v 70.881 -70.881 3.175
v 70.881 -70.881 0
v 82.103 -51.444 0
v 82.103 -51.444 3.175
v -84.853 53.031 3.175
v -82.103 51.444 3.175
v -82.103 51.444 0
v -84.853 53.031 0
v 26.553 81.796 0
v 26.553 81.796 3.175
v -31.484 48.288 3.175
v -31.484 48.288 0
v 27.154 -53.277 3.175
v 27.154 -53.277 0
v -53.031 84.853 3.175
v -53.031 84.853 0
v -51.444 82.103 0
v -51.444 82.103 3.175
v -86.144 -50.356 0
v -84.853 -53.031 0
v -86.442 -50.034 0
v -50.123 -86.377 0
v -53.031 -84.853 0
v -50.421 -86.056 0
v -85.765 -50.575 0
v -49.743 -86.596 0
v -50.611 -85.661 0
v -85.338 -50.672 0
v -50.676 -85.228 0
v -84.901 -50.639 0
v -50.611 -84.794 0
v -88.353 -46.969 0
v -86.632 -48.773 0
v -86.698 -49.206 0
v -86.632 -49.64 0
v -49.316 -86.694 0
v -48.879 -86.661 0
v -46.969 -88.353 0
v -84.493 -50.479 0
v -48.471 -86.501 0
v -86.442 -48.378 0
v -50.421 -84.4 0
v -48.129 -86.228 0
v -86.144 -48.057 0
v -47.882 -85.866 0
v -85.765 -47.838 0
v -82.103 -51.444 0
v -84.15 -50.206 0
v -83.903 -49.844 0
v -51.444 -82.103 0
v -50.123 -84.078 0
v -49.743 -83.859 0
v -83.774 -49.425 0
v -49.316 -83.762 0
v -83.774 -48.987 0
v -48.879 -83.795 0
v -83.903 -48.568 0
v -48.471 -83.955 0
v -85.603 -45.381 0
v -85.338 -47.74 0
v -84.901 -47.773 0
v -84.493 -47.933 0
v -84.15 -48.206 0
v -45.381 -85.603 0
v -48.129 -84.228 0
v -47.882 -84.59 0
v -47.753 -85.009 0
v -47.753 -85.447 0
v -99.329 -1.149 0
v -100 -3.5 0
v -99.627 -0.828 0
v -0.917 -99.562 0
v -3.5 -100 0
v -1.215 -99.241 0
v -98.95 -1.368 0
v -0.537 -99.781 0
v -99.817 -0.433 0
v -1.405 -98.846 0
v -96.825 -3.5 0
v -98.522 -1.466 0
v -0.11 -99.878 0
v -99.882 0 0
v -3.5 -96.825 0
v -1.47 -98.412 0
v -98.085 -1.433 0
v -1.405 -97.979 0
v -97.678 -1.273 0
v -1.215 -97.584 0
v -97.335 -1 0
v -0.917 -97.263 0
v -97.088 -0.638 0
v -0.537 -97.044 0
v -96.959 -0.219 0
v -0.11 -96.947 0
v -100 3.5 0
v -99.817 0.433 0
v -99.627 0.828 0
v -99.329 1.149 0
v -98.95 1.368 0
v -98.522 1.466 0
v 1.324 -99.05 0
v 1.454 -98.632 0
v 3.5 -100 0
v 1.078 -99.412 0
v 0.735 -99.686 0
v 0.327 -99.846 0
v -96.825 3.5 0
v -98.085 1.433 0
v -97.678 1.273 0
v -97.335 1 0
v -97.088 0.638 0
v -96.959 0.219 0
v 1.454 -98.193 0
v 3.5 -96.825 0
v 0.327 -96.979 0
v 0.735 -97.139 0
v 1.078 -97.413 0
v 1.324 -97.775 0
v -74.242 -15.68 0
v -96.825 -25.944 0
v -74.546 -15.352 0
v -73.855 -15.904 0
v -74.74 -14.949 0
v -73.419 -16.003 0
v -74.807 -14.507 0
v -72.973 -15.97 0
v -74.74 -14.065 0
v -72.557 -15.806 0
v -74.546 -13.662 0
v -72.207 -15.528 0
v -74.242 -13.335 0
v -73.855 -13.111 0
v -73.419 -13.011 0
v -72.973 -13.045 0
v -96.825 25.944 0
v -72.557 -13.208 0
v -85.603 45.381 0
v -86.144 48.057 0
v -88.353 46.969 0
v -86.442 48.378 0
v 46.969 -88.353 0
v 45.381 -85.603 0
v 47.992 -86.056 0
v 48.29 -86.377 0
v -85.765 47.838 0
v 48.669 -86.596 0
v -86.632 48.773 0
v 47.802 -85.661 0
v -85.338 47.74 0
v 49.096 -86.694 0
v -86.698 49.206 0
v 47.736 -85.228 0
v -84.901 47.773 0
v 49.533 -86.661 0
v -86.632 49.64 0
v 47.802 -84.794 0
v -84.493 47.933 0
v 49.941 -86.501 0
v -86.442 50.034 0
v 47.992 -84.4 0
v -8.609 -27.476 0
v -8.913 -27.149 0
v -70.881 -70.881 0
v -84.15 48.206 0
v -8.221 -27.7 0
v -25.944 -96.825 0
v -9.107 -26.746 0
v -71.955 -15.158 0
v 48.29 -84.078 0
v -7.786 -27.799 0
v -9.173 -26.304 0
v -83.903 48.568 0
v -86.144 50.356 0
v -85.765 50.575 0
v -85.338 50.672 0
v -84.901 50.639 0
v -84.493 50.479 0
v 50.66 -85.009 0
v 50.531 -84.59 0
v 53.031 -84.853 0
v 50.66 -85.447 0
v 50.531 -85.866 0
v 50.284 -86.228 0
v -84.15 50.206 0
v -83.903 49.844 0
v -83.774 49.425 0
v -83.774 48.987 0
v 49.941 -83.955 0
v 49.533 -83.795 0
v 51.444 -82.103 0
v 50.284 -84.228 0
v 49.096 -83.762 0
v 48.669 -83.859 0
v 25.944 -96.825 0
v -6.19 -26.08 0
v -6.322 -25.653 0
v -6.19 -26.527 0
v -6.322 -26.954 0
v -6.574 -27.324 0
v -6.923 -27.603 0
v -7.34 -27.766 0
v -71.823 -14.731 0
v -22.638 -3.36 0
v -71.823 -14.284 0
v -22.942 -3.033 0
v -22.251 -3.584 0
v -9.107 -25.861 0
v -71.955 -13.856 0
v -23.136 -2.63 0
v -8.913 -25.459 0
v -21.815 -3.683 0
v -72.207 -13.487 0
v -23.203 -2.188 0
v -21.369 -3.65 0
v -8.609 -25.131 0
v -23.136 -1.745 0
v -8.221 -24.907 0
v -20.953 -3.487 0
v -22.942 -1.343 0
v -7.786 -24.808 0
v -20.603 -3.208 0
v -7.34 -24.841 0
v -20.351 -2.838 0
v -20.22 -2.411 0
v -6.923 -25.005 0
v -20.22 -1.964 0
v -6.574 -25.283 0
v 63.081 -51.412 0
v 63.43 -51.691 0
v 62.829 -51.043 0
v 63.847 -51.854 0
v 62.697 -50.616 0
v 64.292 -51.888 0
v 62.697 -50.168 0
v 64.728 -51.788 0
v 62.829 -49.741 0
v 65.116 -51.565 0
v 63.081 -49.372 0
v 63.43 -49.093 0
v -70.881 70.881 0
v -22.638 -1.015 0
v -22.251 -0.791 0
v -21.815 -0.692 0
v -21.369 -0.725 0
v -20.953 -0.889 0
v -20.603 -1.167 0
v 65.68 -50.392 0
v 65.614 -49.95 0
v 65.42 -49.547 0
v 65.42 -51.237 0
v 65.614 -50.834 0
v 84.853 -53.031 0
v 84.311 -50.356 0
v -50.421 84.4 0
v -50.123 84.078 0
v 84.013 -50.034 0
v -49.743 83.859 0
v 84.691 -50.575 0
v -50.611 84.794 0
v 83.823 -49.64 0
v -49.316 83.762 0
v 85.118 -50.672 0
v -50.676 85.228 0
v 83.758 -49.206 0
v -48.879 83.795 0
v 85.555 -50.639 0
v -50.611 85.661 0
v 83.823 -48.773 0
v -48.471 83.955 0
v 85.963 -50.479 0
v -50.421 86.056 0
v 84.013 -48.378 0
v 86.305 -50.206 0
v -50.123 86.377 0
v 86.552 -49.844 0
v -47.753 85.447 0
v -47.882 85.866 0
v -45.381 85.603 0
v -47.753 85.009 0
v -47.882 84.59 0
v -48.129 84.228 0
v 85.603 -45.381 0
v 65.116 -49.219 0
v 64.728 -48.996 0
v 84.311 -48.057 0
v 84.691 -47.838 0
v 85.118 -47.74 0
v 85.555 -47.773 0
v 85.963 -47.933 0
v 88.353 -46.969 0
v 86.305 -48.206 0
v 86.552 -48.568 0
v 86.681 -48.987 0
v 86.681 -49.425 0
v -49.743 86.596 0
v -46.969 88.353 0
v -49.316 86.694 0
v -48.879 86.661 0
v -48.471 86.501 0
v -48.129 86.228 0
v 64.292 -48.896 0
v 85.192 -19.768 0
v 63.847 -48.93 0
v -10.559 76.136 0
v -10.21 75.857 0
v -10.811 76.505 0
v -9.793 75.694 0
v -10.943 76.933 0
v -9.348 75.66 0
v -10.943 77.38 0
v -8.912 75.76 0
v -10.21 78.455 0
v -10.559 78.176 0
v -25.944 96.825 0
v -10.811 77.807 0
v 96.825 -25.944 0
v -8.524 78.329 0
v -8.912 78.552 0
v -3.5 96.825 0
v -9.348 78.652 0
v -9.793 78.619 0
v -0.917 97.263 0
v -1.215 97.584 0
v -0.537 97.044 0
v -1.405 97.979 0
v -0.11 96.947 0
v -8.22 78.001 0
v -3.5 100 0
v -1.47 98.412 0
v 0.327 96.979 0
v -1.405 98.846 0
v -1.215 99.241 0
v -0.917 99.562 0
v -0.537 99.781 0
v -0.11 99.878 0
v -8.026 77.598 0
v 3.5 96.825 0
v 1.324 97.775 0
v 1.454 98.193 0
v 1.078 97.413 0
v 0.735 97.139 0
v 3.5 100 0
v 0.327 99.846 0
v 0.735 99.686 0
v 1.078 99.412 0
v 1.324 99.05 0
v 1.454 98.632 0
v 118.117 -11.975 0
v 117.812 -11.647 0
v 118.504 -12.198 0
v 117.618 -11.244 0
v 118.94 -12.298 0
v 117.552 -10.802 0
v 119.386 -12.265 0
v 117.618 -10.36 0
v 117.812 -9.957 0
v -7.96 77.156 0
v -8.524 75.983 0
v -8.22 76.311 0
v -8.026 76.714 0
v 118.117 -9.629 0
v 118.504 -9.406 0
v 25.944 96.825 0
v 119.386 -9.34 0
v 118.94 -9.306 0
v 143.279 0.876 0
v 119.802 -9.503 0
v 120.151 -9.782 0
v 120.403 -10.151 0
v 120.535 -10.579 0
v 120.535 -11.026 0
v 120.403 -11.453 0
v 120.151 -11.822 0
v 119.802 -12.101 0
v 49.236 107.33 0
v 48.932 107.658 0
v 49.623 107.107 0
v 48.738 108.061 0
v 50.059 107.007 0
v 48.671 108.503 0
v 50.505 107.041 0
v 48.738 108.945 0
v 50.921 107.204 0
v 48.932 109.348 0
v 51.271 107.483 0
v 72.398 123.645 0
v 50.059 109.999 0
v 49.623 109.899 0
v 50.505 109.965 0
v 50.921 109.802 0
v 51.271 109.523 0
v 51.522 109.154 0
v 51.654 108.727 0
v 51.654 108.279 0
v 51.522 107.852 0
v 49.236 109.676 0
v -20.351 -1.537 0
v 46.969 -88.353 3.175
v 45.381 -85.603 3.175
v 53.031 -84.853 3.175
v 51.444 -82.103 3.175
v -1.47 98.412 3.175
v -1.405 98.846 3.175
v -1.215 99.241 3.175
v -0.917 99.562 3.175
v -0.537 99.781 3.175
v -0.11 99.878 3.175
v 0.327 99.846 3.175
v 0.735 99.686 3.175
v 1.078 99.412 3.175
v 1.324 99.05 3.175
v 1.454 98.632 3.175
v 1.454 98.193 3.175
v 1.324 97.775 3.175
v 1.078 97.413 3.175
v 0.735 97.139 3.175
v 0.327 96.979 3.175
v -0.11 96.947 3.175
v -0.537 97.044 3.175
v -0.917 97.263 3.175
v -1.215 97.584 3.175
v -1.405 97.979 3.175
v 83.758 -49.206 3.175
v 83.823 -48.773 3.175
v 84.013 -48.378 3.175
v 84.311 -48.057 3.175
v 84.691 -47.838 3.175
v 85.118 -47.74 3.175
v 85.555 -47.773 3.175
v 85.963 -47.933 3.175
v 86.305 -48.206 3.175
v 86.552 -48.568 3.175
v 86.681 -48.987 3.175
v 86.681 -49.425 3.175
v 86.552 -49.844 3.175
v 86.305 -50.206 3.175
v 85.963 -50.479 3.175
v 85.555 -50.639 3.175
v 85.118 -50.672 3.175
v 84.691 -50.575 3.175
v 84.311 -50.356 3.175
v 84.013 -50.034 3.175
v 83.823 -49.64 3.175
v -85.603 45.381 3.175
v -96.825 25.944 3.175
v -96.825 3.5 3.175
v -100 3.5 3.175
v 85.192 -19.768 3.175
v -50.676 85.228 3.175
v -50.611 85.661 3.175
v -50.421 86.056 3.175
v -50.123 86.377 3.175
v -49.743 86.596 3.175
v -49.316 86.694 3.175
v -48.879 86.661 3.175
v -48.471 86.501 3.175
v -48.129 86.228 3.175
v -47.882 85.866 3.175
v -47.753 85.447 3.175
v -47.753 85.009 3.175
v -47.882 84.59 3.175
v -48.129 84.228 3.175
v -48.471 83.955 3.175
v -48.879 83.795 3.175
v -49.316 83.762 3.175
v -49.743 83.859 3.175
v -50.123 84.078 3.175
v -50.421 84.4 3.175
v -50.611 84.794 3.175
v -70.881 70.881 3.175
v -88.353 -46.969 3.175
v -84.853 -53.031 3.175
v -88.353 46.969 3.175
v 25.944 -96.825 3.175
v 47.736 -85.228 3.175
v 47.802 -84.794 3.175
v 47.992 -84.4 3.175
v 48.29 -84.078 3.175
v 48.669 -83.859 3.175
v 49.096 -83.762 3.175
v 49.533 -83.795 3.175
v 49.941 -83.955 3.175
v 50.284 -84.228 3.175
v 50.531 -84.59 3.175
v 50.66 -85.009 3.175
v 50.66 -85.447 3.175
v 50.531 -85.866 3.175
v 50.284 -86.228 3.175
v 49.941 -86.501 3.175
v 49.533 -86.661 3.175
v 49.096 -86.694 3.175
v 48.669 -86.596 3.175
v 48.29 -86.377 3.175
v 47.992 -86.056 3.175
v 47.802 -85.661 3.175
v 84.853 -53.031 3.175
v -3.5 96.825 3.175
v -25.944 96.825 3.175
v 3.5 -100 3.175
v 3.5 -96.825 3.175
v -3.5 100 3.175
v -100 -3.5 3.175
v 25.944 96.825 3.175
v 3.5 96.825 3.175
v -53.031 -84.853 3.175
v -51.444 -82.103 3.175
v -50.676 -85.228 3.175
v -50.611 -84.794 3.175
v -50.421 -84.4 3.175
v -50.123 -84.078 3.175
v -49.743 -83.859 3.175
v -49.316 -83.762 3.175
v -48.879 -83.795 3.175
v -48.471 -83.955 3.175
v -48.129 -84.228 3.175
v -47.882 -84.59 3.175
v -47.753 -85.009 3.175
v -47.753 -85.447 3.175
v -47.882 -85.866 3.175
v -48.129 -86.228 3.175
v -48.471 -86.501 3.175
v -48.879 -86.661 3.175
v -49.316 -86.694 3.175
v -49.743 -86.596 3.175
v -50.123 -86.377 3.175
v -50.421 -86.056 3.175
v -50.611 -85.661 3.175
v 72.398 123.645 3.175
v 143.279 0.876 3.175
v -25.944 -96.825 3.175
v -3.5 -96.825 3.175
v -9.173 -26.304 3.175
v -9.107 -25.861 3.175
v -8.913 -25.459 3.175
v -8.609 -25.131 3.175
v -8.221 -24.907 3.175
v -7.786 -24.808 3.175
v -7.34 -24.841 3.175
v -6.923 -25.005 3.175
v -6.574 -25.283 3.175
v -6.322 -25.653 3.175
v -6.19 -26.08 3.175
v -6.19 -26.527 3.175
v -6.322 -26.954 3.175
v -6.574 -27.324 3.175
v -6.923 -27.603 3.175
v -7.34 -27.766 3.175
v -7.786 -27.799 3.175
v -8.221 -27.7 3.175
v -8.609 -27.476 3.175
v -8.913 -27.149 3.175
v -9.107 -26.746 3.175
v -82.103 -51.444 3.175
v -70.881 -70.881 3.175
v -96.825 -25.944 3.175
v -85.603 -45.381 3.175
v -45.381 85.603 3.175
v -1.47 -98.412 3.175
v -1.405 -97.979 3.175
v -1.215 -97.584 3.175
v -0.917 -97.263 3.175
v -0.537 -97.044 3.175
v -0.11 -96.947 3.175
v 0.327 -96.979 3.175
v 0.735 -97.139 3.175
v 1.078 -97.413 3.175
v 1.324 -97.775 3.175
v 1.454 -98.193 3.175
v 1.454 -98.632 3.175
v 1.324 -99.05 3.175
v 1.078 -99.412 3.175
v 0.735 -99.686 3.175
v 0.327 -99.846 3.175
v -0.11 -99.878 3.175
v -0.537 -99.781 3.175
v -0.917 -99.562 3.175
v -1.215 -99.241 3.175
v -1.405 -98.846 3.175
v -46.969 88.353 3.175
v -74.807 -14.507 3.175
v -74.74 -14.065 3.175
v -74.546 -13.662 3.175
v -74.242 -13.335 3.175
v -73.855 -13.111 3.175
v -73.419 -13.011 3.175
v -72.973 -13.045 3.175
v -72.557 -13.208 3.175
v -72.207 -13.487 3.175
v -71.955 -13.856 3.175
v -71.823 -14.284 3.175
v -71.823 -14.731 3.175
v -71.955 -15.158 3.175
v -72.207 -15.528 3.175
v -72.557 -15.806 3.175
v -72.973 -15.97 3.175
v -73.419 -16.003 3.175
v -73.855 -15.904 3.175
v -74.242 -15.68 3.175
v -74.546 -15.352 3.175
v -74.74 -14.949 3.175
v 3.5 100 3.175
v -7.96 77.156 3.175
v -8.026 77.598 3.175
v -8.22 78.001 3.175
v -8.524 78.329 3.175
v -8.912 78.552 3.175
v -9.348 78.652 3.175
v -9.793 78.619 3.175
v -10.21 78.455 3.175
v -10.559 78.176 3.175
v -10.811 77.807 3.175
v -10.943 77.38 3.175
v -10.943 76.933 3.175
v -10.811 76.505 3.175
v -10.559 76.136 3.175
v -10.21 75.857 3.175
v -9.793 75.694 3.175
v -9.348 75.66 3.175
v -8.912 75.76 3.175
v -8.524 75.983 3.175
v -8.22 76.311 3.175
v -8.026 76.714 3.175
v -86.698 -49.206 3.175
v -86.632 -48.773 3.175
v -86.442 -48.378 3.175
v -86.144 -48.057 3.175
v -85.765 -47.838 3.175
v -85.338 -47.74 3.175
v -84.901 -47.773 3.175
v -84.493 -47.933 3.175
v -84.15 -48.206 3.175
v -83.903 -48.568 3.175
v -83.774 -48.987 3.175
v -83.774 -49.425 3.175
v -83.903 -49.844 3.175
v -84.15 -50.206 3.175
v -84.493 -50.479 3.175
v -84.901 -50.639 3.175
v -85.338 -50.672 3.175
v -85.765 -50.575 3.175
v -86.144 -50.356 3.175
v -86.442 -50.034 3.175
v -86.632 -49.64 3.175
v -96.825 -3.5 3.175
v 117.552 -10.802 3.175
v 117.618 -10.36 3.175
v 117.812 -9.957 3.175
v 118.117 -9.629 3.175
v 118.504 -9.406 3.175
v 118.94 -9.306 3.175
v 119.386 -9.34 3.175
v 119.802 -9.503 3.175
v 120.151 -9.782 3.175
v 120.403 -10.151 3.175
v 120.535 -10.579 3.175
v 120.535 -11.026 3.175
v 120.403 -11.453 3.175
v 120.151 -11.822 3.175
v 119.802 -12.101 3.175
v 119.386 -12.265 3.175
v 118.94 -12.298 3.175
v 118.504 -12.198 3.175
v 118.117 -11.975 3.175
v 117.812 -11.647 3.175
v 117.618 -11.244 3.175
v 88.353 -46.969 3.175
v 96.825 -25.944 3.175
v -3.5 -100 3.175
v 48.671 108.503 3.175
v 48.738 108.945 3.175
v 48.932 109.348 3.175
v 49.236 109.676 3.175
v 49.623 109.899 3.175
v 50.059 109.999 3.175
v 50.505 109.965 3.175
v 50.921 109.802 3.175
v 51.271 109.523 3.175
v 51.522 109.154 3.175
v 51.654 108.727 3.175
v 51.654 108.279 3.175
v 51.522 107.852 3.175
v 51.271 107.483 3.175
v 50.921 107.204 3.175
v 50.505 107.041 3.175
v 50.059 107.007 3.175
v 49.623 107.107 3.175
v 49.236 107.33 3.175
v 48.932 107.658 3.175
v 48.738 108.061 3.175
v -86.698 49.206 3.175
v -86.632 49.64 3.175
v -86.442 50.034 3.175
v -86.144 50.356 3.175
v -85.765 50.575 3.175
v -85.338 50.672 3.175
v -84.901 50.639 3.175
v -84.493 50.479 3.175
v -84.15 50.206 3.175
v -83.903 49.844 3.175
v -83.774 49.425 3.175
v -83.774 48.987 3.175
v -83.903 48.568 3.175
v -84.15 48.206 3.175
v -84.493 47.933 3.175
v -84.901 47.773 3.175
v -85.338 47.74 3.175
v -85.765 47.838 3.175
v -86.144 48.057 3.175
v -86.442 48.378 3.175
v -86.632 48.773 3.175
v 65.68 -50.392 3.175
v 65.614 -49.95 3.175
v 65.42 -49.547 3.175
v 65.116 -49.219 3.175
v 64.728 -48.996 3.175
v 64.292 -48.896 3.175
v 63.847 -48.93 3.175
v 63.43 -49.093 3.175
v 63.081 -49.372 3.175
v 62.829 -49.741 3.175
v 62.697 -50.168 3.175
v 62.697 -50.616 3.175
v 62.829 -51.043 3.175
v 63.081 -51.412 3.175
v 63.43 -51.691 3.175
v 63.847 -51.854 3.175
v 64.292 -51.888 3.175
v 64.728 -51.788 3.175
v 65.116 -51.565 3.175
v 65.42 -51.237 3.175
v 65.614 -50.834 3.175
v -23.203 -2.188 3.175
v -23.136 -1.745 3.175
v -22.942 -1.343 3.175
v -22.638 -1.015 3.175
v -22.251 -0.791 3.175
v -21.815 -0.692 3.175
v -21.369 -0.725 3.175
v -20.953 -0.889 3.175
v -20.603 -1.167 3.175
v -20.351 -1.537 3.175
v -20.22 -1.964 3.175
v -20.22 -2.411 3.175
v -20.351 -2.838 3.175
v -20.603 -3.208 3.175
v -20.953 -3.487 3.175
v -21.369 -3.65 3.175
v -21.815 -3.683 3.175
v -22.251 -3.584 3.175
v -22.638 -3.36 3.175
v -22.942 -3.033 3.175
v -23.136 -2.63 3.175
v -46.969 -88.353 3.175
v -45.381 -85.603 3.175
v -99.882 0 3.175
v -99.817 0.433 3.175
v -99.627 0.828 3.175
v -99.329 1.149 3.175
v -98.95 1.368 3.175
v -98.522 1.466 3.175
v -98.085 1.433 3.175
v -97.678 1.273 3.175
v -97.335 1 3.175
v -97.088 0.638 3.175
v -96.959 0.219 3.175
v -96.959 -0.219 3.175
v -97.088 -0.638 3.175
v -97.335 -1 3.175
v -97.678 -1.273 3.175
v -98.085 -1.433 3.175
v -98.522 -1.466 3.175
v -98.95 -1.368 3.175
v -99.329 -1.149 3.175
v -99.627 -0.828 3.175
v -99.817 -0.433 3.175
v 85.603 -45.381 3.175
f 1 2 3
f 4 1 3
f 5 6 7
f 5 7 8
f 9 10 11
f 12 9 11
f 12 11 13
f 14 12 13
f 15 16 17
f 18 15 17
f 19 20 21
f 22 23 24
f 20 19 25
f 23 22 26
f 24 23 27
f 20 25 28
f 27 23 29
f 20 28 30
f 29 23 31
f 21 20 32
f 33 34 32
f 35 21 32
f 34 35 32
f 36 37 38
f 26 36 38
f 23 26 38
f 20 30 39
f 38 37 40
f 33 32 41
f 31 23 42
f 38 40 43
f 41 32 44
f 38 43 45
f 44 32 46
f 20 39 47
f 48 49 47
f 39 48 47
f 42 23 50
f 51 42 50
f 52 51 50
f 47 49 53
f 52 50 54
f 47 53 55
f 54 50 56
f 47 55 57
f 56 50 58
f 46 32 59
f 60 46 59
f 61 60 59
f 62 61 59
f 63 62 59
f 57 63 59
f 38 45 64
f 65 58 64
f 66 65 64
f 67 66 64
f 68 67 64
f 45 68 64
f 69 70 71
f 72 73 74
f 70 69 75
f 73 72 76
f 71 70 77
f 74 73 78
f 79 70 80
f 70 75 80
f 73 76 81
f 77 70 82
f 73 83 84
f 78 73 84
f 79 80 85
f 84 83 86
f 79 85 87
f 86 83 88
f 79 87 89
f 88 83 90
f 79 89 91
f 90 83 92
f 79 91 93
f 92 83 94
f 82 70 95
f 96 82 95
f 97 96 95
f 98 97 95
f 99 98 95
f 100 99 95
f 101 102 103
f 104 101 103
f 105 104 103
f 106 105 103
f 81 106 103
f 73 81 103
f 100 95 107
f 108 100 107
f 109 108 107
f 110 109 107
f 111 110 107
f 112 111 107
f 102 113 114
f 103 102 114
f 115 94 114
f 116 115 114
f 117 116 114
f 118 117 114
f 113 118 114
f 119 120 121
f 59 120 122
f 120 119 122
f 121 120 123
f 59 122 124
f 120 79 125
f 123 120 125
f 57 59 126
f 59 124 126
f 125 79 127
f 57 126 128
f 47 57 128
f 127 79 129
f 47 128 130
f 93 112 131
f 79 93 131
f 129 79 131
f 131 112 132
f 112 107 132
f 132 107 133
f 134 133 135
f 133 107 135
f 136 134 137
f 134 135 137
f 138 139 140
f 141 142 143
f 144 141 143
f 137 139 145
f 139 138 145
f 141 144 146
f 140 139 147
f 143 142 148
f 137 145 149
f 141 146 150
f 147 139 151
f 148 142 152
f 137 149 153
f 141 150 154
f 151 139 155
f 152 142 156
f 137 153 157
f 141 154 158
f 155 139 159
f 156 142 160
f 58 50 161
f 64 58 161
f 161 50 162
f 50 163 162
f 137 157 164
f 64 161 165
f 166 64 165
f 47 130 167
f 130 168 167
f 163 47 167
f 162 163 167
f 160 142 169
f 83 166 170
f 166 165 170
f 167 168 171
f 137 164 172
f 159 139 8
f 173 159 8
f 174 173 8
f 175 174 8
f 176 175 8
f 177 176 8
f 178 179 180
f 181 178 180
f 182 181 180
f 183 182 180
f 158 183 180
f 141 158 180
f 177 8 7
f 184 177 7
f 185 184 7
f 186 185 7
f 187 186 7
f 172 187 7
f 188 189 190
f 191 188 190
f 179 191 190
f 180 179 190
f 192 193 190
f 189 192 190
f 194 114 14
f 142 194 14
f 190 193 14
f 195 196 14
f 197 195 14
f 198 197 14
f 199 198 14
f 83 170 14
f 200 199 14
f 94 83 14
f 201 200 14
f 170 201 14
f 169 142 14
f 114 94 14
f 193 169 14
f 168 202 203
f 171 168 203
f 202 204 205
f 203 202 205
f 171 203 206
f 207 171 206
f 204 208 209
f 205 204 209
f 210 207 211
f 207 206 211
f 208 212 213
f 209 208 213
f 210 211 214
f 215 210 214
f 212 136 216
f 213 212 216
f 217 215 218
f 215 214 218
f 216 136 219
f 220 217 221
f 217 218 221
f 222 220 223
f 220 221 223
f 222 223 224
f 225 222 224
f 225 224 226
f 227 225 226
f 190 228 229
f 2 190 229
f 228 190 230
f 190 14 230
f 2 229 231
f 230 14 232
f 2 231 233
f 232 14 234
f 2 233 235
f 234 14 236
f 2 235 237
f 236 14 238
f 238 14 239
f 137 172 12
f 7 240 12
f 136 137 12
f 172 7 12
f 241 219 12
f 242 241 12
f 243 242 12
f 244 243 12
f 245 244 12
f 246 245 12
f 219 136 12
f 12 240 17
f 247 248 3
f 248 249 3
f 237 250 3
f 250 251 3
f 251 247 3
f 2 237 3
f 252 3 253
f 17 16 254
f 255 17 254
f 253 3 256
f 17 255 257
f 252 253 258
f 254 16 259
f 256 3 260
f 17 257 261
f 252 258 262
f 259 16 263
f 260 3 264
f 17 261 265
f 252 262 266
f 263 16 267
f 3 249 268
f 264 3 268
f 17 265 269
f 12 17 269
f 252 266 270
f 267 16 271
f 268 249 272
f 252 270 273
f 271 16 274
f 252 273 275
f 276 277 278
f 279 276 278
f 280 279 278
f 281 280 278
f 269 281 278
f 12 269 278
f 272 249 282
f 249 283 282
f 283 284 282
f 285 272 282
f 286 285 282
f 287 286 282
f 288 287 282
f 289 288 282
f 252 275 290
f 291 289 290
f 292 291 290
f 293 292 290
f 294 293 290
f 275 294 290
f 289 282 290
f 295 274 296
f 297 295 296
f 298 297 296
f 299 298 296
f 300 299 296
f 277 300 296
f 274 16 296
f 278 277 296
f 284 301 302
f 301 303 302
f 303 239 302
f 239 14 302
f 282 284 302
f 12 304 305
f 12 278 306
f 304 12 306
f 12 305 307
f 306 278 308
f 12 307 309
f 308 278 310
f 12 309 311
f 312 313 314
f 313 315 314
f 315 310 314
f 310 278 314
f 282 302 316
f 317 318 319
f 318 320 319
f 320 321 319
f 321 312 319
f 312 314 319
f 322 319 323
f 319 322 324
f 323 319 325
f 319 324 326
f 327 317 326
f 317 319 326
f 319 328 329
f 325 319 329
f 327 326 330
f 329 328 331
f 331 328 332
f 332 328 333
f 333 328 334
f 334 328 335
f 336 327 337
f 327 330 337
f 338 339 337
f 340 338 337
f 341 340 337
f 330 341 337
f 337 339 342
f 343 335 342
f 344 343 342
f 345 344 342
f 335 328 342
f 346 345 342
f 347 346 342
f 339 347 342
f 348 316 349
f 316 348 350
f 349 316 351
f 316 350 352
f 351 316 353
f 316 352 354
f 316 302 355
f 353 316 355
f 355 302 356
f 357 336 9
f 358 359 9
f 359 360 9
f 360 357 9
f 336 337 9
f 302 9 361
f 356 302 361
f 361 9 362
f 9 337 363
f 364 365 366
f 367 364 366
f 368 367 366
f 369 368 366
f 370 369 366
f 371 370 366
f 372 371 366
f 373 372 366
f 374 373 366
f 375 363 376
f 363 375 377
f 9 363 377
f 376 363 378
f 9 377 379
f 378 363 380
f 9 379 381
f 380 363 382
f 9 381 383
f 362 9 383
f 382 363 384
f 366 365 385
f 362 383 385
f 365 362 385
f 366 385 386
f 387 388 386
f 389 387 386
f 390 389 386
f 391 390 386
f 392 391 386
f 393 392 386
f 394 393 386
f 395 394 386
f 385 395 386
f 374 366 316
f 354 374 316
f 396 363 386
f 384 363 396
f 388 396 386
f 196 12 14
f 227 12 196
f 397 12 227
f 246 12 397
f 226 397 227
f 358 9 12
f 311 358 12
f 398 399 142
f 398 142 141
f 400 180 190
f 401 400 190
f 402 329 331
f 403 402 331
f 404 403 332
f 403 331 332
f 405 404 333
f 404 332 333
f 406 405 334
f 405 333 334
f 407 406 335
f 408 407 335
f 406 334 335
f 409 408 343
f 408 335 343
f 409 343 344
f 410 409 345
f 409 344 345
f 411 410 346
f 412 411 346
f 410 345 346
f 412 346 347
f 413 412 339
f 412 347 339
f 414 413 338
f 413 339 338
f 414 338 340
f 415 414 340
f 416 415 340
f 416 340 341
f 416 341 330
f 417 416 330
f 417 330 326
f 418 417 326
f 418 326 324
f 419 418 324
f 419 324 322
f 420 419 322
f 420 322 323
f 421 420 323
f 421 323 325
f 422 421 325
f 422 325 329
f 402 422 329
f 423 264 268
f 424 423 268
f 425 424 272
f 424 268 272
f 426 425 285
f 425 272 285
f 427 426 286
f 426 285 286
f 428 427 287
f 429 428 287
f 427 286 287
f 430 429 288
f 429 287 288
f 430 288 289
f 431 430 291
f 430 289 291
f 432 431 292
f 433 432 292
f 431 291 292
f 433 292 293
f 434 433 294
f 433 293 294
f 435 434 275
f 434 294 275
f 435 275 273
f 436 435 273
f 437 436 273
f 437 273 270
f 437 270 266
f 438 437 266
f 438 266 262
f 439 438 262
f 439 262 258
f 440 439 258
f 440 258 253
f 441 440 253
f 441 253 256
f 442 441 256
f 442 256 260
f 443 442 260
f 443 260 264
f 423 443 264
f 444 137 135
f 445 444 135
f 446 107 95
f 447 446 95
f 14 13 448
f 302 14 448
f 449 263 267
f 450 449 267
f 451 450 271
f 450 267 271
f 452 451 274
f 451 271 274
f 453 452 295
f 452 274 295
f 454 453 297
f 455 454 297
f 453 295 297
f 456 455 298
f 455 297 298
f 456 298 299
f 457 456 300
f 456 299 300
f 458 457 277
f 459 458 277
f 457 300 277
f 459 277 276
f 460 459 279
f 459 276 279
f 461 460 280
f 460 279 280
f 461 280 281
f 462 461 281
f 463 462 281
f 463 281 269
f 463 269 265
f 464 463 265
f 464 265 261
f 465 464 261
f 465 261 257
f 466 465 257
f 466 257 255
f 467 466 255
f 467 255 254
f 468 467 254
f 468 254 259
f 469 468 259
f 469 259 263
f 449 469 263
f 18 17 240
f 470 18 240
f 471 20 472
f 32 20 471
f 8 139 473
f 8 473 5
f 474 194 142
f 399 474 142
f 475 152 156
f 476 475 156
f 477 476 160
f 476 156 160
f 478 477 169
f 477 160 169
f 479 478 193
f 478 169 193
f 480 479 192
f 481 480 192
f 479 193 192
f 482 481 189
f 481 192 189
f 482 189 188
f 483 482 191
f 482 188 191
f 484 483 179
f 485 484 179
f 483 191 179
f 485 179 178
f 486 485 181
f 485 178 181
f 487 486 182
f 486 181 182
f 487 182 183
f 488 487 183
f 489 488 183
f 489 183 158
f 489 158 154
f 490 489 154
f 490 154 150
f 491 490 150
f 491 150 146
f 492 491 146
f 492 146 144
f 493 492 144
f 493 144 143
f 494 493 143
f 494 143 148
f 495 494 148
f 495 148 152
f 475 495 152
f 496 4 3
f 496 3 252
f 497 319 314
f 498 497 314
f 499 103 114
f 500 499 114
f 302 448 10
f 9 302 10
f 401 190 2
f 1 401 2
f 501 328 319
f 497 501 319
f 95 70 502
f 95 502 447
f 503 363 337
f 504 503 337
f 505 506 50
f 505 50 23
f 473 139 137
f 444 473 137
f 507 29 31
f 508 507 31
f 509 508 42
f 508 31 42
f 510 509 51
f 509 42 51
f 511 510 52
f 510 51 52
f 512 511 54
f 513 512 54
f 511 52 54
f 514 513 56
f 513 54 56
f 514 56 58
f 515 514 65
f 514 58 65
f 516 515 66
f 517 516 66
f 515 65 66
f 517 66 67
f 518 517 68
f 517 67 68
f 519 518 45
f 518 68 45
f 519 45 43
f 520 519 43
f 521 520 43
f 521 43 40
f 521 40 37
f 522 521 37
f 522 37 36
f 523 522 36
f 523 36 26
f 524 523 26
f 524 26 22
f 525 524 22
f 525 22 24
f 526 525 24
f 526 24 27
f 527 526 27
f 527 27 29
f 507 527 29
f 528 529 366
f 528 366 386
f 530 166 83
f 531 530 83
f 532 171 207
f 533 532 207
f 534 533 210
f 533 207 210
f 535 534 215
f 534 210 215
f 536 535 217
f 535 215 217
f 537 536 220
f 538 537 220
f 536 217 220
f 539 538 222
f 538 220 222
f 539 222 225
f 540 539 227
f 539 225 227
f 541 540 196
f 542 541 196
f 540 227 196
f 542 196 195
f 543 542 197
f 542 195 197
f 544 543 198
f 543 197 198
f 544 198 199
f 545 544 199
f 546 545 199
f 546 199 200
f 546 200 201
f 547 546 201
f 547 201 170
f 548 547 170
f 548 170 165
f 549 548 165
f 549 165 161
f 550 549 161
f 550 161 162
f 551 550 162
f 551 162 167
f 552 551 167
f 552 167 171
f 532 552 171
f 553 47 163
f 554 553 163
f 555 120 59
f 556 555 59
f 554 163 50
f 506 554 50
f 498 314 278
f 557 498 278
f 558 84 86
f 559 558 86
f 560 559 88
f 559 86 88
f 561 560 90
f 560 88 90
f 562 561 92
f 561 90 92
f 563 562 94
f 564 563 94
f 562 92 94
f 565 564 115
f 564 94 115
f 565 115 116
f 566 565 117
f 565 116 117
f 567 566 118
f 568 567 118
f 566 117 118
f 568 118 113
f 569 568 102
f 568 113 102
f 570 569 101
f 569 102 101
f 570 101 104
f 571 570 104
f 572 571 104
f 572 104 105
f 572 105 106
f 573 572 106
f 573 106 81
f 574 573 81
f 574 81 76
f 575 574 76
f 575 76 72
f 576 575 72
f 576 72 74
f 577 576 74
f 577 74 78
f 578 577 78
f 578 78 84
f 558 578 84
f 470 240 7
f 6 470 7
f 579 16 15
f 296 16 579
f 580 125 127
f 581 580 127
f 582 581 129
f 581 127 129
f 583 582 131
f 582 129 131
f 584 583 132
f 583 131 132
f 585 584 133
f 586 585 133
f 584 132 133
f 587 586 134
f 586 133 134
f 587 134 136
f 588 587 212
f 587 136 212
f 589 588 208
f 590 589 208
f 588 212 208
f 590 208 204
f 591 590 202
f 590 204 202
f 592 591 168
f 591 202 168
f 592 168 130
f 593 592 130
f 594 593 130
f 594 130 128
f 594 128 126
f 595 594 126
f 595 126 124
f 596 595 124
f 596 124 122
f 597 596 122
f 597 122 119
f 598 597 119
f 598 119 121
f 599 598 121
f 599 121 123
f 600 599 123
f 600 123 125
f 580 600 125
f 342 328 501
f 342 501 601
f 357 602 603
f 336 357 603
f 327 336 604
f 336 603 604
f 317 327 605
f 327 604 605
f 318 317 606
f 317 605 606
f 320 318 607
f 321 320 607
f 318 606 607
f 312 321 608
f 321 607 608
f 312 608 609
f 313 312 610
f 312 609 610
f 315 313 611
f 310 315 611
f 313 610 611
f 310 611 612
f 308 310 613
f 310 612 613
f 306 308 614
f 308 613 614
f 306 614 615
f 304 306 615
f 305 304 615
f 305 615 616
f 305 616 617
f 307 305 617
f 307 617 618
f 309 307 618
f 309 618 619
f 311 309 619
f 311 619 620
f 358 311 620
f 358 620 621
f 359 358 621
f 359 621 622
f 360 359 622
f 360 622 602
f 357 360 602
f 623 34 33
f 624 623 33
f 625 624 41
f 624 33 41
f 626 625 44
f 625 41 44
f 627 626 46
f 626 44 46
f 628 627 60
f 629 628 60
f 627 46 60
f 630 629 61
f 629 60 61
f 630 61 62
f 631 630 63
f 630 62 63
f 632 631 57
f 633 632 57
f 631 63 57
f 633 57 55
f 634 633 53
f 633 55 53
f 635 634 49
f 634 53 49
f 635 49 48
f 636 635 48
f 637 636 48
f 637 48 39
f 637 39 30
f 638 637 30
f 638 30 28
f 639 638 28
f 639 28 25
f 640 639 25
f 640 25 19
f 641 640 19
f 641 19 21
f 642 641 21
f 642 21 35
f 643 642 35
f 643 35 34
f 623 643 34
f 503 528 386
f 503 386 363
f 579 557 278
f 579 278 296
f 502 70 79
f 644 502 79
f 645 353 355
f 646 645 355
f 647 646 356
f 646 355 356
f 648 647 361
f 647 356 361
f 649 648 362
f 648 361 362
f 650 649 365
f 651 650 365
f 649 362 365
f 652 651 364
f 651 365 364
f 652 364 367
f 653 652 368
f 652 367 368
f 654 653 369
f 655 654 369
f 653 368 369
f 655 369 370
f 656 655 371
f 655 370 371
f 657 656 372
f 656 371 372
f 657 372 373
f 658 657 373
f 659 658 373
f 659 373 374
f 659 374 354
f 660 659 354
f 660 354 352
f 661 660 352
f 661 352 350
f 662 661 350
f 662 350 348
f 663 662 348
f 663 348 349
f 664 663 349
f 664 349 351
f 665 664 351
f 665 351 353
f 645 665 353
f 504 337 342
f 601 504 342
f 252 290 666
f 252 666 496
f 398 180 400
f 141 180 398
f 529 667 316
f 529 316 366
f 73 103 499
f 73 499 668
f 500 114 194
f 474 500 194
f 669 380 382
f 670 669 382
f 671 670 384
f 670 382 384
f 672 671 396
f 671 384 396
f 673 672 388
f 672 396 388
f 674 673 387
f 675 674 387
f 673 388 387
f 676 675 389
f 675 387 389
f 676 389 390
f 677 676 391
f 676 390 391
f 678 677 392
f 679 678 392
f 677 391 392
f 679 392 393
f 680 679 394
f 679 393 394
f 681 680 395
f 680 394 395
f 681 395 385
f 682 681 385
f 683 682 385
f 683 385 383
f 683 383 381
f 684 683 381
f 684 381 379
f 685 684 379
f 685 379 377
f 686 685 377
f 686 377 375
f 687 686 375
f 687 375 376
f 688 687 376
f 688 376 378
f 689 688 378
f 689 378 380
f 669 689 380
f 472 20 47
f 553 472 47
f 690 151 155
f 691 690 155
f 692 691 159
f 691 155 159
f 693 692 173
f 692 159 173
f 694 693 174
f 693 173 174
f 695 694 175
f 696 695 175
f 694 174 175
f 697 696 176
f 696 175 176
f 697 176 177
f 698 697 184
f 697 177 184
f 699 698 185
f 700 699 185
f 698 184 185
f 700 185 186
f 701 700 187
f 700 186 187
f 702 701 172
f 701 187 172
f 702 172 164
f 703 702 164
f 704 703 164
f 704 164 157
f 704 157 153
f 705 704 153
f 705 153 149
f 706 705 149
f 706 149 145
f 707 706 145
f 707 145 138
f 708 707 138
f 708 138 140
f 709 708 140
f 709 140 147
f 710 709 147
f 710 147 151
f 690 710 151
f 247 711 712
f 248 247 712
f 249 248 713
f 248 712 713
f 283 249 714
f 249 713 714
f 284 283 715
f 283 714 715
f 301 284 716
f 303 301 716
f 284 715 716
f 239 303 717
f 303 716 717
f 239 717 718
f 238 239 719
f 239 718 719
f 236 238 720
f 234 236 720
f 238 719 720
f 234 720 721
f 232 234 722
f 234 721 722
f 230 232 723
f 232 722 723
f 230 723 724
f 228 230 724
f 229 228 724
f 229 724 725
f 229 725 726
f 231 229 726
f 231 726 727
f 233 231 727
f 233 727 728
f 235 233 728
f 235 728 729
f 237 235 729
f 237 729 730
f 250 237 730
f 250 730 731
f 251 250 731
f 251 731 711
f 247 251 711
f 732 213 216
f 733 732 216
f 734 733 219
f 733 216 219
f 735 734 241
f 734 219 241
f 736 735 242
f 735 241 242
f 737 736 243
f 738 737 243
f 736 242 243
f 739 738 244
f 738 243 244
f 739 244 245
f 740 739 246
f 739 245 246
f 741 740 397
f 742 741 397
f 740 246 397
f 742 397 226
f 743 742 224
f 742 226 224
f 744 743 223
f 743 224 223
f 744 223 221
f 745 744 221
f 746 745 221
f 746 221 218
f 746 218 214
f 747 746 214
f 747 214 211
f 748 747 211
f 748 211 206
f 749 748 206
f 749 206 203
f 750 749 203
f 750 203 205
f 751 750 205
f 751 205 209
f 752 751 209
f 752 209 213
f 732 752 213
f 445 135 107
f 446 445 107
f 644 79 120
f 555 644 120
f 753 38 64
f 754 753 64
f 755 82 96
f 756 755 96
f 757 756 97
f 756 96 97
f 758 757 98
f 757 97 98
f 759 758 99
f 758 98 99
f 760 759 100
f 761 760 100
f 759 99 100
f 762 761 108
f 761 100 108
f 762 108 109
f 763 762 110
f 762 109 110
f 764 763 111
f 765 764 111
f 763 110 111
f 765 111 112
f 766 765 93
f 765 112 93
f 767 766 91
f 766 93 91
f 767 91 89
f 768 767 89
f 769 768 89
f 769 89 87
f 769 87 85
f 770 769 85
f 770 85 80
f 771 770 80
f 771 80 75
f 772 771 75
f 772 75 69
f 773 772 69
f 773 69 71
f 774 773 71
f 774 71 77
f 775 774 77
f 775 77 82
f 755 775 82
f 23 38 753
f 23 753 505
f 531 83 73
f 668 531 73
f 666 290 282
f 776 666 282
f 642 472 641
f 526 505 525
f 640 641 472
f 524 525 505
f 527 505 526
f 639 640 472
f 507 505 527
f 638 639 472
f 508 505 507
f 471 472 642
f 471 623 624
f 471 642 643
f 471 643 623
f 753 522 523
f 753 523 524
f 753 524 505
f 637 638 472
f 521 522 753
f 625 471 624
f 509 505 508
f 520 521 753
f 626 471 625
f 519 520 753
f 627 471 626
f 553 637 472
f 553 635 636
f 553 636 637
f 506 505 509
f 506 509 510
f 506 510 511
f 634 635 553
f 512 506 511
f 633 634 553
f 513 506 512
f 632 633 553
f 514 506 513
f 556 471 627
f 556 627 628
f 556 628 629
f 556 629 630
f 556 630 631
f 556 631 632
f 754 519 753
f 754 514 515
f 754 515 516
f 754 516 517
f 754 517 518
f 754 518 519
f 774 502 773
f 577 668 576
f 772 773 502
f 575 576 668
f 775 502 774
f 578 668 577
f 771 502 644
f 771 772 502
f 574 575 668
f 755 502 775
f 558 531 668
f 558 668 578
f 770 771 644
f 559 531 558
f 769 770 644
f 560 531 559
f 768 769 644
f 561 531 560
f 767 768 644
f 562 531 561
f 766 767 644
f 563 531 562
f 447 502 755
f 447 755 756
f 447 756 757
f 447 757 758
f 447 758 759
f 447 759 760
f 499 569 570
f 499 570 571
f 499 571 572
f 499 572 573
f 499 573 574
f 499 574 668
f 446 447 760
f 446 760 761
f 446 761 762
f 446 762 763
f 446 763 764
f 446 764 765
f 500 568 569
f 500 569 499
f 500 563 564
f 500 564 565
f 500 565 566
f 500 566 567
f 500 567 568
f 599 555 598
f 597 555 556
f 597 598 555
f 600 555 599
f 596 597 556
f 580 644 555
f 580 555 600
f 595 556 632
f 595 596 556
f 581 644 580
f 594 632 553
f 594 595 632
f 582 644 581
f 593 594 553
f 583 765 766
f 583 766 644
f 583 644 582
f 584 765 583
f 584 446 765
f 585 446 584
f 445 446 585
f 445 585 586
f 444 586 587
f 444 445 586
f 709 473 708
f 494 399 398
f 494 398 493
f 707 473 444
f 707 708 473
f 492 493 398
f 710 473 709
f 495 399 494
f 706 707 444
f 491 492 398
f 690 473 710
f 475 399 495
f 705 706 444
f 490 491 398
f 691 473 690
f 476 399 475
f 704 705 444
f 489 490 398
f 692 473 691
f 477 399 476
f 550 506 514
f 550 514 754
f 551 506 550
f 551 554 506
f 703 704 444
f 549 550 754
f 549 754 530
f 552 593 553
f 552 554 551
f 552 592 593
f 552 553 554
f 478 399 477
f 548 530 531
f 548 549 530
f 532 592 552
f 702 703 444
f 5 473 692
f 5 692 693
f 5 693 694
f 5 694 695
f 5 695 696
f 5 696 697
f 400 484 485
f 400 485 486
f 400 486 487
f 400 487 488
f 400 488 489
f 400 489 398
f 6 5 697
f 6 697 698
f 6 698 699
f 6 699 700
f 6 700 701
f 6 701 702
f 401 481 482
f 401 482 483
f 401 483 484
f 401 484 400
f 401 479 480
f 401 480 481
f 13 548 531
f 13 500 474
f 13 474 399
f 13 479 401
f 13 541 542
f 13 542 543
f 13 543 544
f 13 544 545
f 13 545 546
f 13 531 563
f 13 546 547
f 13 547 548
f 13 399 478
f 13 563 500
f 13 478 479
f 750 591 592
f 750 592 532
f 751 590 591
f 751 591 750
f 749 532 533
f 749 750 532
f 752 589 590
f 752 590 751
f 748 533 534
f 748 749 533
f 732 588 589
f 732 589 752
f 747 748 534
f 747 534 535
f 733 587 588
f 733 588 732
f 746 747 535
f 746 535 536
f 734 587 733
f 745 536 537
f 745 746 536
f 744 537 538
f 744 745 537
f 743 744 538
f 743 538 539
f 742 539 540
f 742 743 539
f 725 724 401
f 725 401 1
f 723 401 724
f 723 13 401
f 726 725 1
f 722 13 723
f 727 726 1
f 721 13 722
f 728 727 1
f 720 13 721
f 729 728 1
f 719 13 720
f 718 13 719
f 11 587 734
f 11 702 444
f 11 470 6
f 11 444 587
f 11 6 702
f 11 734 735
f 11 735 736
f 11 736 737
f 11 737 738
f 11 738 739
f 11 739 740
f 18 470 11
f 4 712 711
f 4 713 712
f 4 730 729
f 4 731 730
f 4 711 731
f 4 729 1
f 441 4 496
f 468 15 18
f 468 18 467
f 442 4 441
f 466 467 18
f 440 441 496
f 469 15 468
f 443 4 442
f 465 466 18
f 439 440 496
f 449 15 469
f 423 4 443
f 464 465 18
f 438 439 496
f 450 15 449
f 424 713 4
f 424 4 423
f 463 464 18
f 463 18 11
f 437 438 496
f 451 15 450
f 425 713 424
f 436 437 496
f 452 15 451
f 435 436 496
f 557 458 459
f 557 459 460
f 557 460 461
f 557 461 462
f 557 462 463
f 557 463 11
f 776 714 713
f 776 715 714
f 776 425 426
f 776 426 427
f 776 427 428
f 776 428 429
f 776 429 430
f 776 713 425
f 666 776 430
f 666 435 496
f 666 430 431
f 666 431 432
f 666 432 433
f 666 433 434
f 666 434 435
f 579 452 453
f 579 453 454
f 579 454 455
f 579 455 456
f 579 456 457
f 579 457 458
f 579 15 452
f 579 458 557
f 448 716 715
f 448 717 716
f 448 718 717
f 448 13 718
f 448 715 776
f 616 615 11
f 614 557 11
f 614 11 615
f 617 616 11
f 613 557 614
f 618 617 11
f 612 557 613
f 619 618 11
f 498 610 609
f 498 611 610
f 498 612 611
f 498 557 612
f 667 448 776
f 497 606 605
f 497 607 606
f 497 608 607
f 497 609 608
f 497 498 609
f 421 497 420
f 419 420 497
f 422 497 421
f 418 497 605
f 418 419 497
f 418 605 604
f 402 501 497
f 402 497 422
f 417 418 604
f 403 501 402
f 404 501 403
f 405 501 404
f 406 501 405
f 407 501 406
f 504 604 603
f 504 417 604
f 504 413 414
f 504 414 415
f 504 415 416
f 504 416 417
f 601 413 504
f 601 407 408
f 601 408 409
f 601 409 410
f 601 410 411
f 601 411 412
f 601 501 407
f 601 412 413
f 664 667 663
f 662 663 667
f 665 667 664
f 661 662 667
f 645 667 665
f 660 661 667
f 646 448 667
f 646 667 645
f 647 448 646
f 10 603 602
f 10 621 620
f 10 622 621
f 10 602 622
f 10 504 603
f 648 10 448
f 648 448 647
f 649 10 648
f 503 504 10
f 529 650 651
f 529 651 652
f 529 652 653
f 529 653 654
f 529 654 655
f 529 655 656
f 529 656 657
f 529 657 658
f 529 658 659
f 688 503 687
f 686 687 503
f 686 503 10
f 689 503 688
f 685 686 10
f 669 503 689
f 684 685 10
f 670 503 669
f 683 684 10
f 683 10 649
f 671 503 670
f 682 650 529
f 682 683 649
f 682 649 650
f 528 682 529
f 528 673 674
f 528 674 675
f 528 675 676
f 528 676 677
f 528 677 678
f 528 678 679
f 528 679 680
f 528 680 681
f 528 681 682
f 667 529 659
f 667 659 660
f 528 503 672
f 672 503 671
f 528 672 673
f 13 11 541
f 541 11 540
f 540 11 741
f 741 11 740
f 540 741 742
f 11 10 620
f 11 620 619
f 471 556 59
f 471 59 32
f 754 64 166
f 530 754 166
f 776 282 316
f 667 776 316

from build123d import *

# Parameters (mm, degrees)
BOSS_EXTRUDE1_DEPTH = 3.175
SKETCH3_R           = 1.47
CUT_EXTRUDE5_DEPTH  = 10
CUT_EXTRUDE6_DEPTH  = 10
BOSS_EXTRUDE2_DEPTH = 3.175
SKETCH7_R           = 1.5
CUT_EXTRUDE7_DEPTH  = 10
SKETCH9_R           = 1.5
CUT_EXTRUDE9_DEPTH  = 10
CUT_EXTRUDE10_DEPTH = 10
SKETCH11_R          = 1.5
CUT_EXTRUDE11_DEPTH = 10


with BuildPart() as part:
    # Sketch1 → Boss-Extrude1 (new body)
    with BuildSketch(Plane.XY):
        Polygon((-26.794919243, 100), (26.794919243, 100), (73.205080757, 73.205080757), (100, 26.794919243), (100, -26.794919243), (73.205080757, -73.205080757), (26.794919243, -100), (-26.794919243, -100), (-73.205080757, -73.205080757), (-100, -26.794919243), (-100, 26.794919243), (-73.205080757, 73.205080757), align=None)
    extrude(amount=BOSS_EXTRUDE1_DEPTH)

    # Sketch3 → Cut-Extrude5 (cut)
    with BuildSketch(Plane(origin=(0, 0, 0), x_dir=(-1, 0, 0), z_dir=(0, 0, -1))):
        Polygon((51.443588913, -82.102909721), (53.031088913, -84.852540378), (73.205080757, -73.205080757), (84.852540378, -53.031088913), (82.102909721, -51.443588913), (70.880819443, -70.880819443), align=None)
        Polygon((-26.794919243, -100), (-3.5, -100), (-3.5, -96.825), (-25.944180557, -96.825), (-45.381411087, -85.602909721), (-46.968911087, -88.352540378), align=None)
        Polygon((-73.205080757, -73.205080757), (-53.031088913, -84.852540378), (-51.443588913, -82.102909721), (-70.880819443, -70.880819443), (-82.102909721, -51.443588913), (-84.852540378, -53.031088913), align=None)
        with Locations((-49.20625, -85.22772505)):
            Circle(SKETCH3_R)
        Polygon((-100, -26.794919243), (-88.352540378, -46.968911087), (-85.602909721, -45.381411087), (-96.825, -25.944180557), (-96.825, -3.5), (-100, -3.5), align=None)
        Polygon((-100, 26.794919243), (-100, 3.5), (-96.825, 3.5), (-96.825, 25.944180557), (-85.602909721, 45.381411087), (-88.352540378, 46.968911087), align=None)
        Polygon((-26.794919243, 100), (-46.968911087, 88.352540378), (-45.381411087, 85.602909721), (-25.944180557, 96.825), (-3.5, 96.825), (-3.5, 100), align=None)
        Polygon((26.794919243, 100), (3.5, 100), (3.5, 96.825), (25.944180557, 96.825), (45.381411087, 85.602909721), (46.968911087, 88.352540378), align=None)
        Polygon((73.205080757, 73.205080757), (53.031088913, 84.852540378), (51.443588913, 82.102909721), (70.880819443, 70.880819443), (82.102909721, 51.443588913), (84.852540378, 53.031088913), align=None)
        with Locations((-85.22772505, 49.20625)):
            Circle(SKETCH3_R)
        with Locations((-49.20625, 85.22772505)):
            Circle(SKETCH3_R)
        with Locations((0, 98.4125)):
            Circle(SKETCH3_R)
        with Locations((49.20625, 85.22772505)):
            Circle(SKETCH3_R)
        with Locations((85.22772505, 49.20625)):
            Circle(SKETCH3_R)
        with Locations((98.4125, 0)):
            Circle(SKETCH3_R)
        Polygon((96.825, -3.5), (96.825, -25.944180557), (85.602909721, -45.381411087), (88.352540378, -46.968911087), (100, -26.794919243), (100, -3.5), align=None)
        with Locations((85.22772505, -49.20625)):
            Circle(SKETCH3_R)
        Polygon((45.381411087, -85.602909721), (25.944180557, -96.825), (3.5, -96.825), (3.5, -100), (26.794919243, -100), (46.968911087, -88.352540378), align=None)
        with Locations((0, -98.4125)):
            Circle(SKETCH3_R)
        with Locations((49.20625, -85.22772505)):
            Circle(SKETCH3_R)
        with Locations((-85.22772505, -49.20625)):
            Circle(SKETCH3_R)
        with Locations((-98.4125, 0)):
            Circle(SKETCH3_R)
        Polygon((-82.102909721, 51.443588913), (-70.880819443, 70.880819443), (-51.443588913, 82.102909721), (-53.031088913, 84.852540378), (-73.205080757, 73.205080757), (-84.852540378, 53.031088913), align=None)
        Polygon((100, 26.794919243), (88.352540378, 46.968911087), (85.602909721, 45.381411087), (96.825, 25.944180557), (96.825, 3.5), (100, 3.5), align=None)
    extrude(amount=-CUT_EXTRUDE5_DEPTH, mode=Mode.SUBTRACT)

    # Sketch4 → Cut-Extrude6 (cut)
    with BuildSketch(Plane.XY.offset(3.175)):
        Polygon((27.531680557, 99.574630657), (25.944180557, 96.825), (96.825, -25.944180557), (100, -25.944180557), (100, 27.816263625), (73.190593106, 73.213445206), align=None)
    extrude(amount=-CUT_EXTRUDE6_DEPTH, mode=Mode.SUBTRACT)

    # Sketch5 → Boss-Extrude2 (add)
    with BuildSketch(Plane.XY.offset(3.175)):
        Polygon((96.825, -25.944180557), (143.278603525, 0.875819943), (72.397784082, 123.6450005), (25.944180557, 96.825), align=None)
    extrude(amount=-BOSS_EXTRUDE2_DEPTH)

    # Sketch7 → Cut-Extrude7 (cut)
    with BuildSketch(Plane(origin=(0, 0, 0), x_dir=(-1, 0, 0), z_dir=(0, 0, -1))):
        with Locations((-119.051801763, -10.8021295)):
            Circle(SKETCH7_R)
        with Locations((-50.17098232, 108.502949442)):
            Circle(SKETCH7_R)
    extrude(amount=-CUT_EXTRUDE7_DEPTH, mode=Mode.SUBTRACT)

    # Sketch9 → Cut-Extrude9 (cut)
    with BuildSketch(Plane(origin=(0, 0, 0), x_dir=(-1, 0, 0), z_dir=(0, 0, -1))):
        with Locations((73.306739868, -14.507270856)):
            Circle(SKETCH9_R)
        with Locations((21.70291705, -2.187552088)):
            Circle(SKETCH9_R)
        with Locations((7.673469234, -26.303617148)):
            Circle(SKETCH9_R)
    extrude(amount=-CUT_EXTRUDE9_DEPTH, mode=Mode.SUBTRACT)

    # Sketch10 → Cut-Extrude10 (cut)
    with BuildSketch(Plane.XY.offset(3.175)):
        Polygon((27.153871113, -53.276548933), (85.191651102, -19.768396257), (26.553283992, 81.796259373), (-31.484495997, 48.288106697), align=None)
    extrude(amount=-CUT_EXTRUDE10_DEPTH, mode=Mode.SUBTRACT)

    # Sketch11 → Cut-Extrude11 (cut)
    with BuildSketch(Plane.XY.offset(3.175)):
        with Locations((64.18037908, -50.392061509)):
            Circle(SKETCH11_R)
        with Locations((-9.45962092, 77.156159961)):
            Circle(SKETCH11_R)
    extrude(amount=-CUT_EXTRUDE11_DEPTH, mode=Mode.SUBTRACT)


solid = part.part
